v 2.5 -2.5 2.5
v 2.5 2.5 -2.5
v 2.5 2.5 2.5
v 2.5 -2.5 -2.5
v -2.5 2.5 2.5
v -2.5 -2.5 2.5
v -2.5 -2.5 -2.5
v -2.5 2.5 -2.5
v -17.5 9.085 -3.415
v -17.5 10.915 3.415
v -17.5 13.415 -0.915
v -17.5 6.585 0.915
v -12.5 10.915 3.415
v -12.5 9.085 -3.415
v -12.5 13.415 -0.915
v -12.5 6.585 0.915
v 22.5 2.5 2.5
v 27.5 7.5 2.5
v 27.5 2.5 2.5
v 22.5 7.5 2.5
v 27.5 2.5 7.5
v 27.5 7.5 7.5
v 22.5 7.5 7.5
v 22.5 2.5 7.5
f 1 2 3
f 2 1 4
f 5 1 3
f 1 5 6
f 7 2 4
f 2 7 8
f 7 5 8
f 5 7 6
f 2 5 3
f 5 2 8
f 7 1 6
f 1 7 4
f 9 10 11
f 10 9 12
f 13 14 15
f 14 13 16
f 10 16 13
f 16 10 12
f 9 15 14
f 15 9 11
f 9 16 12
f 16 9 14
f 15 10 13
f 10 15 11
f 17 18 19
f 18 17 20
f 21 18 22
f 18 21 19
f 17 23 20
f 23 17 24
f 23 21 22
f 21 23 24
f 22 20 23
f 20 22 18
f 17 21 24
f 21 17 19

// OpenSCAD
// file: ../linalg.scad
// ============================================================================
// Minimal Linear Algebra Utilities (for so3, se3, etc.)
// ----------------------------------------------------------------------------
// Provides basic vector and matrix operations needed for transformations.
// - Vector constructors and normalization
// - Identity matrices
// - Rotation/translation parts extraction
// - Transpose and inverse (rigid transform)
// - Hadamard (elementwise) product
// ============================================================================

epsilon = 1e-9;

// --- Vector Constructors ----------------------------------------------------
function vec3(p) = (len(p) < 3) ? concat(p, 0) : p;
function vec4(p) =
  let (v3 = vec3(p)) (len(v3) < 4) ? concat(v3, 1) : v3;

function unit(v) = v / norm(v);

// --- Identity Matrices ------------------------------------------------------
function identity3() =
  [
    [1, 0, 0],
    [0, 1, 0],
    [0, 0, 1],
  ];

function identity4() =
  [
    [1, 0, 0, 0],
    [0, 1, 0, 0],
    [0, 0, 1, 0],
    [0, 0, 0, 1],
  ];

// --- Vector Access Helpers --------------------------------------------------
function take3(v) = [v[0], v[1], v[2]];
function tail3(v) = [v[3], v[4], v[5]];

// --- Matrix Part Extraction -------------------------------------------------
function rotation_part(m) =
  [
    take3(m[0]),
    take3(m[1]),
    take3(m[2]),
  ];

function translation_part(m) = [m[0][3], m[1][3], m[2][3]];

// --- Rotation Metrics -------------------------------------------------------
function rot_trace(m) = m[0][0] + m[1][1] + m[2][2];
function rot_cos_angle(m) = (rot_trace(m) - 1) / 2;

// --- Matrix Transpose -------------------------------------------------------
function transpose_3(m) =
  [
    [m[0][0], m[1][0], m[2][0]],
    [m[0][1], m[1][1], m[2][1]],
    [m[0][2], m[1][2], m[2][2]],
  ];

function transpose_4(m) =
  [
    [m[0][0], m[1][0], m[2][0], m[3][0]],
    [m[0][1], m[1][1], m[2][1], m[3][1]],
    [m[0][2], m[1][2], m[2][2], m[3][2]],
    [m[0][3], m[1][3], m[2][3], m[3][3]],
  ];

// --- Rigid Transform Utilities ---------------------------------------------
function invert_rt(m) =
  let (
    R = transpose_3(rotation_part(m)),
    t = -(R * translation_part(m))
  ) construct_Rt(R, t);

function construct_Rt(R, t) =
  [
    concat(R[0], t[0]),
    concat(R[1], t[1]),
    concat(R[2], t[2]),
    [0, 0, 0, 1],
  ];

// --- Elementwise Operations -------------------------------------------------
// Hadamard product: works recursively on arrays, multiplies scalars directly.
function hadamard(a, b) =
  is_list(a) ? [for (i = [0:1:len(a) - 1]) hadamard(a[i], b[i])] : a * b;
// file: ../so3.scad
// ============================================================================
// SO(3) Utilities (3D Rotation Group)
// ----------------------------------------------------------------------------
// Provides exponential and logarithm maps for SO(3).
// - so3_exp(w): exponential map from axis-angle (deg)
// - so3_ln(m): logarithm map from rotation matrix → axis-angle (deg)
// ----------------------------------------------------------------------------
// Dependencies:
//   - linalg.scad
// ============================================================================

use <linalg.scad>

// --- Rodrigues Formula (core exp) ------------------------------------------

// Build rotation matrix given axis w and coefficients A, B
function rodrigues_so3_exp(w, A, B) =
  [
    [1.0 - B * (w[1] * w[1] + w[2] * w[2]), B * (w[0] * w[1]) - A * w[2], B * (w[0] * w[2]) + A * w[1]],
    [B * (w[0] * w[1]) + A * w[2], 1.0 - B * (w[0] * w[0] + w[2] * w[2]), B * (w[1] * w[2]) - A * w[0]],
    [B * (w[0] * w[2]) - A * w[1], B * (w[1] * w[2]) + A * w[0], 1.0 - B * (w[0] * w[0] + w[1] * w[1])],
  ];

// --- Exponential Map --------------------------------------------------------

// Wrapper: exponential map with input in degrees
function so3_exp(w) = so3_exp_rad(w / 180 * PI);

// Exponential map in radians, uses Taylor expansions for small angles
function so3_exp_rad(w) =
  combine_so3_exp(
    w,
    (w * w < 1e-8) ? so3_exp_1(w * w)
    : (w * w < 1e-6) ? so3_exp_2(w * w)
    : so3_exp_3(w * w)
  );

function combine_so3_exp(w, AB) =
  rodrigues_so3_exp(w, AB[0], AB[1]);

// --- Taylor Expansions (near 0) --------------------------------------------

function so3_exp_1(theta_sq) = [1 - theta_sq / 6, 0.5];

function so3_exp_2(theta_sq) =
  [
    1.0 - theta_sq * (1.0 - theta_sq / 20) / 6,
    0.5 - 0.25 / 6 * theta_sq,
  ];

function so3_exp_3_0(theta_deg, inv_theta) =
  [
    sin(theta_deg) * inv_theta,
    (1 - cos(theta_deg)) * (inv_theta * inv_theta),
  ];

function so3_exp_3(theta_sq) =
  so3_exp_3_0(sqrt(theta_sq) * 180 / PI, 1 / sqrt(theta_sq));

// --- Logarithm Map ----------------------------------------------------------

// Axis part from skew-symmetric difference
function rot_axis_part(m) =
  [m[2][1] - m[1][2], m[0][2] - m[2][0], m[1][0] - m[0][1]] * 0.5;

// Logarithm: returns axis-angle in degrees
function so3_ln(m) = 180 / PI * so3_ln_rad(m);

// Logarithm in radians
function so3_ln_rad(m) =
  so3_ln_0(
    m,
    cos_angle=rot_cos_angle(m),
    preliminary_result=rot_axis_part(m)
  );

function so3_ln_0(m, cos_angle, preliminary_result) =
  so3_ln_1(
    m, cos_angle, preliminary_result,
    sin_angle_abs=sqrt(preliminary_result * preliminary_result)
  );

function so3_ln_1(m, cos_angle, preliminary_result, sin_angle_abs) =
  (cos_angle > sqrt(0.5)) ?
    (
      sin_angle_abs > 0 ?
        preliminary_result * asin(sin_angle_abs) * PI / 180 / sin_angle_abs
      : preliminary_result
    )
  : (cos_angle > -sqrt(0.5)) ?
    preliminary_result * acos(cos_angle) * PI / 180 / sin_angle_abs
  : so3_get_symmetric_part_rotation(
    preliminary_result, m,
    angle=PI - asin(sin_angle_abs) * PI / 180,
    d0=m[0][0] - cos_angle,
    d1=m[1][1] - cos_angle,
    d2=m[2][2] - cos_angle
  );

// --- Symmetric Part Handling (for near-π cases) -----------------------------

function so3_get_symmetric_part_rotation(preliminary_result, m, angle, d0, d1, d2) =
  so3_get_symmetric_part_rotation_0(
    preliminary_result,
    angle,
    so3_largest_column(m, d0, d1, d2)
  );

function so3_get_symmetric_part_rotation_0(preliminary_result, angle, c_max) =
  angle * unit((c_max * preliminary_result < 0) ? -c_max : c_max);

function so3_largest_column(m, d0, d1, d2) =
  (d0 * d0 > d1 * d1 && d0 * d0 > d2 * d2) ?
    [d0, (m[1][0] + m[0][1]) / 2, (m[0][2] + m[2][0]) / 2]
  : (d1 * d1 > d2 * d2) ?
    [(m[1][0] + m[0][1]) / 2, d1, (m[2][1] + m[1][2]) / 2]
  : [(m[0][2] + m[2][0]) / 2, (m[2][1] + m[1][2]) / 2, d2];
// file: ../trajectory.scad
// ============================================================================
// Trajectory Utilities
// ----------------------------------------------------------------------------
// Purpose : Provide a clean way to construct SE(3) “twist” vectors
//           (translation + rotation) from intuitive parameters.
// Features:
//   - Flexible specification of translation (left/right, up/down, fwd/back)
//   - Flexible specification of rotation (pitch, yaw, roll) or direct vector
//   - Helpers for dealing with undef inputs and selection logic
//   - trajectory(...) returns [tx,ty,tz, yaw,pitch,roll] 6D vector
//   - rotationm(...) builds a 3x3 rotation matrix from angles
// ----------------------------------------------------------------------------
// Dependencies: so3.scad
// Author(s): adapted and cleaned up from original scad-utils
// ============================================================================

use <so3.scad>

// --- Helpers ----------------------------------------------------------------

// Return `a` unless it is undef, then use `default`.
function val(a = undef, default = undef) =
  is_undef(a) ? default : a;

// Check if vector/list is fully undef or out-of-bounds (recursively).
function vec_is_undef(x, index_ = 0) =
  index_ >= len(x) ? true
  : is_undef_or_oob(x[index_]) && vec_is_undef(x, index_ + 1);

// Treat scalars, lists, or undef consistently.
function is_undef_or_oob(x) =
  is_undef(x) ? true
  : is_list(x) ? vec_is_undef(x)
  : false;

// Either return a or b (whichever is valid). If both valid → undef.
// If both invalid → default.
function either(a, b, default = undef) =
  is_undef_or_oob(a) ? (is_undef_or_oob(b) ? default : b)
  : is_undef_or_oob(b) ? a
  : undef;

// --- Translation builders ---------------------------------------------------

// Accepts directional keywords (left/right, up/down, forward/backward)
// or an explicit `translation` vector. Returns [x,y,z] or undef.
function translationv(
  left = undef,
  right = undef,
  up = undef,
  down = undef,
  forward = undef,
  backward = undef,
  translation = undef
) =
  translationv_2(
    // X axis points "up" (OpenSCAD’s Z is height, but we’re flexible here)
    x=either(up, is_undef(down) ? down : -down),
    y=either(right, is_undef(left) ? left : -left),
    z=either(forward, is_undef(backward) ? backward : -backward),
    translation=translation
  );

// Internal helper to finalize translation vector.
function translationv_2(x, y, z, translation) =
  (is_undef(x) && is_undef(y) && is_undef(z)) ? translation
  : (is_undef_or_oob(translation) ? [val(x, 0), val(y, 0), val(z, 0)] : undef);

// --- Rotation builders ------------------------------------------------------

// Accepts yaw/pitch/roll angles (deg), or an explicit `rotation` vector.
// Returns [yaw, pitch, roll] vector or undef.
function rotationv(
  pitch = undef,
  yaw = undef,
  roll = undef,
  rotation = undef
) =
  is_undef(rotation) ? [val(yaw, 0), val(pitch, 0), val(roll, 0)]
  : (is_undef(pitch) && is_undef(yaw) && is_undef(roll)) ? rotation
  : undef;

// --- Main API ---------------------------------------------------------------

// trajectory(...) → build a 6D twist vector = [tx,ty,tz, yaw,pitch,roll]
function trajectory(
  left = undef,
  right = undef,
  up = undef,
  down = undef,
  forward = undef,
  backward = undef,
  translation = undef,
  pitch = undef,
  yaw = undef,
  roll = undef,
  rotation = undef
) =
  concat(
    translationv(
      left=left, right=right, up=up, down=down,
      forward=forward, backward=backward,
      translation=translation
    ),
    rotationv(pitch=pitch, yaw=yaw, roll=roll, rotation=rotation)
  );

// rotationm(...) → build 3x3 rotation matrix from angles
function rotationm(rotation = undef, pitch = undef, yaw = undef, roll = undef) =
  so3_exp(rotationv(rotation=rotation, pitch=pitch, yaw=yaw, roll=roll));
// main file
include <../trajectory.scad>
include <../so3.scad>

$fn = 24;

// --- Regression / Echo Tests ------------------------------------------------
echo("Forward 10 =", trajectory(forward=10)); // expect [0,0,10, 0,0,0]
echo("Up 5, Left 3 =", trajectory(up=5, left=3)); // expect [-3,5,0, 0,0,0]
echo("Yaw 45 =", rotationv(yaw=45)); // expect [45,0,0]
echo("Pitch 90 matrix =", rotationm(pitch=90));

// Combined twist
twist1 = trajectory(forward=20, yaw=45);
echo("Combined twist =", twist1);

// --- Visual Demonstrations --------------------------------------------------

// Helper: apply trajectory to a cube
module demo_traj(traj, col = "lightblue") {
  T = concat(take3(traj), [0]); // translation
  R = rotationm(rotation=tail3(traj));
  multmatrix(
    [
      [R[0][0], R[0][1], R[0][2], T[0]],
      [R[1][0], R[1][1], R[1][2], T[1]],
      [R[2][0], R[2][1], R[2][2], T[2]],
      [0, 0, 0, 1],
    ]
  )
    color(col) cube([5, 5, 5], center=true);
}

// Show original then two trajectory examples side by side
translate([0, 0, 0]) demo_traj(trajectory(up=0), "lightblue");
translate([-20, 0, 0]) demo_traj(trajectory(right=10, up=5, yaw=30), "red");
translate([20, 0, 0]) demo_traj(trajectory(translation=[5, 5, 5], rotation=[0, 90, 0]), "green");
